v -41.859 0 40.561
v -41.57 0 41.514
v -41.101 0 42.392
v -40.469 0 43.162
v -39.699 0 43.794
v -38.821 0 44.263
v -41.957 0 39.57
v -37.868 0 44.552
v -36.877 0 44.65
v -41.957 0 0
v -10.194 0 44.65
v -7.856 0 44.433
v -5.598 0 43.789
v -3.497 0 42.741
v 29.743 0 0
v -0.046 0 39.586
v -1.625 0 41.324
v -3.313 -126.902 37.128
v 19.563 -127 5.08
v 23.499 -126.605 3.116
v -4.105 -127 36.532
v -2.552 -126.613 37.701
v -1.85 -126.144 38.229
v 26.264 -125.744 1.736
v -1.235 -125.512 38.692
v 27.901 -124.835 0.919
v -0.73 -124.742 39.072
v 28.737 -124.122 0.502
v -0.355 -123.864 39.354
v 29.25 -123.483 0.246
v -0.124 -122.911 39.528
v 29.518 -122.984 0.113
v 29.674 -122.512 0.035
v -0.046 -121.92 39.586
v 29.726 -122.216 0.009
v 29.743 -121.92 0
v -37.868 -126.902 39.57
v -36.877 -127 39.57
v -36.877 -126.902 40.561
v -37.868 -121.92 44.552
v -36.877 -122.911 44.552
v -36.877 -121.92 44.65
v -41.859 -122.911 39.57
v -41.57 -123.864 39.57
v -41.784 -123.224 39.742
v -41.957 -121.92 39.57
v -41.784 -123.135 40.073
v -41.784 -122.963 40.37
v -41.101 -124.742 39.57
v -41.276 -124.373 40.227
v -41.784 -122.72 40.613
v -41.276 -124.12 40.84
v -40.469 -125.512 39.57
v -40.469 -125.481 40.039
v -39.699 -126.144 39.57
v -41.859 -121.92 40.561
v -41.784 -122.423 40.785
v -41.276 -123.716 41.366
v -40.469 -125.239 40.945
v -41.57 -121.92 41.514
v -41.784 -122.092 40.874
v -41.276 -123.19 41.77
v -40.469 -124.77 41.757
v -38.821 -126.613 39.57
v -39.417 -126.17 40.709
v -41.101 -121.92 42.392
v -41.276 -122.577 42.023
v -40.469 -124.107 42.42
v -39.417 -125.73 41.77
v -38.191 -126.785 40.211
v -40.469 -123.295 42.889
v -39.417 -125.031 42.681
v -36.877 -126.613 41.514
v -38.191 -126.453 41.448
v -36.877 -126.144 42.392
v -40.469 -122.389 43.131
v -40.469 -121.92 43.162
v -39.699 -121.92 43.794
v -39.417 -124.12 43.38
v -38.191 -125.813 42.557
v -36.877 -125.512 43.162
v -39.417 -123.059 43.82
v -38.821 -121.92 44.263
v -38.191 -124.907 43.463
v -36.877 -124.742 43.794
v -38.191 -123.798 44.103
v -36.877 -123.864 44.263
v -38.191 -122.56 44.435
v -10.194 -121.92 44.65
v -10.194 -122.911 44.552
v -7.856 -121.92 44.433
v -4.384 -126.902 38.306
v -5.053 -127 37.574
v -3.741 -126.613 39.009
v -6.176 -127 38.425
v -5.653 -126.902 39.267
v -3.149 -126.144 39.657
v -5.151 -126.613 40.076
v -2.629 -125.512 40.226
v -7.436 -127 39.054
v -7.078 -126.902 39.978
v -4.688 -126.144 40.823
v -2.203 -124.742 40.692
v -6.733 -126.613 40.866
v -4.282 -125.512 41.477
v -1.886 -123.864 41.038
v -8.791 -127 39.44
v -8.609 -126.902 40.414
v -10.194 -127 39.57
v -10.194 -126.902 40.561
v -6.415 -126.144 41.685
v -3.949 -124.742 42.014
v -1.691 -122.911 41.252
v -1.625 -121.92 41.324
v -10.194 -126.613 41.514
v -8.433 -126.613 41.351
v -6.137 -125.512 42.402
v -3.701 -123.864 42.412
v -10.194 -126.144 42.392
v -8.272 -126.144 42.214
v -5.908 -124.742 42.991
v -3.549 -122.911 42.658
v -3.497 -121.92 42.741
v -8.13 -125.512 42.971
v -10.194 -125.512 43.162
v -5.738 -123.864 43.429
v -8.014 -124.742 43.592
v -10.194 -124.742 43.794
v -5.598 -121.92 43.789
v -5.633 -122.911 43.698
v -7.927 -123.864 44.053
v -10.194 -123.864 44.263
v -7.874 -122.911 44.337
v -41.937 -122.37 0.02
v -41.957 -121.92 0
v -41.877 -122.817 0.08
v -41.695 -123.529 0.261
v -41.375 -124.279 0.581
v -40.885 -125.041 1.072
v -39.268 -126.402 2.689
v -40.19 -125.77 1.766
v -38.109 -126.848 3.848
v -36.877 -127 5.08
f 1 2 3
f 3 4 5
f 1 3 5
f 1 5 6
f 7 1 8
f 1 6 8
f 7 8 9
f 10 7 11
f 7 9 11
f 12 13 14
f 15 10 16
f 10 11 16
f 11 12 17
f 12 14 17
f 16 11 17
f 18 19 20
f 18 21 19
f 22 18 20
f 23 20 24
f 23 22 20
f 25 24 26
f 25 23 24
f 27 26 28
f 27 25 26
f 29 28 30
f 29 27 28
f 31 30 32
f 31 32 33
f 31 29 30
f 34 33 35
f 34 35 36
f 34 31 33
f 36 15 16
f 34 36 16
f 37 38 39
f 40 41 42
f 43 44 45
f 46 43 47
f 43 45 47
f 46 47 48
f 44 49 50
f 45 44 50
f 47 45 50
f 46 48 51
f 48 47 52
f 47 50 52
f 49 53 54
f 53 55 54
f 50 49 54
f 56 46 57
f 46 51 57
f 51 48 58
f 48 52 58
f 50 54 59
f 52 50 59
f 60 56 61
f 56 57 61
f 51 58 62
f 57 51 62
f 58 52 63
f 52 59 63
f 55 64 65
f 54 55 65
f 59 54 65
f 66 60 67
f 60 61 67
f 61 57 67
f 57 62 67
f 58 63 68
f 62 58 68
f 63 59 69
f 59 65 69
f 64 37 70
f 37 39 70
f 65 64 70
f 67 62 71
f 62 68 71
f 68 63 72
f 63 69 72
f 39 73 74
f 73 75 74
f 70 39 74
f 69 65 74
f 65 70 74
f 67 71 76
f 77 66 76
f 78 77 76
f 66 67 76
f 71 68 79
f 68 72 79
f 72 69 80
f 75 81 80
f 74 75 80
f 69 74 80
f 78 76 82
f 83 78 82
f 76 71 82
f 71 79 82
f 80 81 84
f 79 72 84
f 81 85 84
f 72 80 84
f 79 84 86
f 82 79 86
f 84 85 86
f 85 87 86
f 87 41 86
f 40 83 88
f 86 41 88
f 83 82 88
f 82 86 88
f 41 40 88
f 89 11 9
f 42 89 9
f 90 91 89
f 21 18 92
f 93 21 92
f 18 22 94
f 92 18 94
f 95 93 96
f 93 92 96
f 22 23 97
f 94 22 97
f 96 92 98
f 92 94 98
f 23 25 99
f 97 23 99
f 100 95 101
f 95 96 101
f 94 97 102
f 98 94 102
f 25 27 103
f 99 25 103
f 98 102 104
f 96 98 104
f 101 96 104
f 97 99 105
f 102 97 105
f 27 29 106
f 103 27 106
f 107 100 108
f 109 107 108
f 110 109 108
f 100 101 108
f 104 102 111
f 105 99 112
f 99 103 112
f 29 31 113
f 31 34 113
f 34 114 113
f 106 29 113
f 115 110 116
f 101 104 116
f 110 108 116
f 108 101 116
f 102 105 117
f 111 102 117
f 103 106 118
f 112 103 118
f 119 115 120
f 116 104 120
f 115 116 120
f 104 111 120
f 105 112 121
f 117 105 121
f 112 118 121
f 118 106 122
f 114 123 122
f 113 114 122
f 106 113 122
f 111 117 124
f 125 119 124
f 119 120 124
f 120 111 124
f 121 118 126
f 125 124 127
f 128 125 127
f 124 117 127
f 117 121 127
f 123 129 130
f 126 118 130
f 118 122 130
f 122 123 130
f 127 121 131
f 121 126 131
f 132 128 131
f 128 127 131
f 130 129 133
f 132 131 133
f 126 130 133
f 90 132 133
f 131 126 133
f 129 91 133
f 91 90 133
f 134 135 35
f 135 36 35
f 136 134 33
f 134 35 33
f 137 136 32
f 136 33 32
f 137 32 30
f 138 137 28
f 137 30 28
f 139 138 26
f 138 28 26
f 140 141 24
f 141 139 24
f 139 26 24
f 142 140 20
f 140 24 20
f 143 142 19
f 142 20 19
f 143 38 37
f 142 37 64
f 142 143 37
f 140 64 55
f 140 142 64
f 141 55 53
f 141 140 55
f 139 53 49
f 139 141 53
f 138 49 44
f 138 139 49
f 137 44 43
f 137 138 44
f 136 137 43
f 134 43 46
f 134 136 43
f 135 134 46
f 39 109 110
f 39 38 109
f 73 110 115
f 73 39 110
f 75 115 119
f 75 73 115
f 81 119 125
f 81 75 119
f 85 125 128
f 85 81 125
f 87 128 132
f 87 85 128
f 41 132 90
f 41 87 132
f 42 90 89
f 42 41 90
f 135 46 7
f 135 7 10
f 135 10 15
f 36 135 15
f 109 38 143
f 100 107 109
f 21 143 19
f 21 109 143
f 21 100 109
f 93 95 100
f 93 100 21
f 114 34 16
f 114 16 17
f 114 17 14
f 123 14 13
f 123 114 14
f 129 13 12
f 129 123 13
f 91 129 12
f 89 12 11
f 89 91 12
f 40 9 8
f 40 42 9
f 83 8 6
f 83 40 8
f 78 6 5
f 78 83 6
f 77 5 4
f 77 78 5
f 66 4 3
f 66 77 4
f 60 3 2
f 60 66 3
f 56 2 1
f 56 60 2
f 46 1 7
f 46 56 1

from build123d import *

# Parameters (mm, degrees)
F1_DEPTH = 127
F2_R     = 12.7
F3_R     = 5.08


with BuildPart() as f1:
    # F0 (on Front) → F1 (new body)
    with BuildSketch(Plane.XZ):
        Polygon((-41.956668, 44.650039), (-41.956668, 0), (29.74316, 0), (-3.856668, 44.650039), align=None)
    extrude(amount=F1_DEPTH)

    # F2
    f2_edges = [f1.edges().sort_by_distance(p)[0] for p in [
        (-3.856668, -63.5, 44.650039),
    ]]
    fillet(f2_edges, radius=F2_R)

    # F3
    f3_edges = [f1.edges().sort_by_distance(p)[0] for p in [
        (-26.07529, -127, 44.650039),
        (-4.523432, -127, 43.313826),
        (-41.956668, -127, 22.325019),
        (14.848492, -127, 19.793182),
        (-6.106754, -127, 0),
        (-41.956668, -63.5, 44.650039),
    ]]
    fillet(f3_edges, radius=F3_R)


solid = f1.part
